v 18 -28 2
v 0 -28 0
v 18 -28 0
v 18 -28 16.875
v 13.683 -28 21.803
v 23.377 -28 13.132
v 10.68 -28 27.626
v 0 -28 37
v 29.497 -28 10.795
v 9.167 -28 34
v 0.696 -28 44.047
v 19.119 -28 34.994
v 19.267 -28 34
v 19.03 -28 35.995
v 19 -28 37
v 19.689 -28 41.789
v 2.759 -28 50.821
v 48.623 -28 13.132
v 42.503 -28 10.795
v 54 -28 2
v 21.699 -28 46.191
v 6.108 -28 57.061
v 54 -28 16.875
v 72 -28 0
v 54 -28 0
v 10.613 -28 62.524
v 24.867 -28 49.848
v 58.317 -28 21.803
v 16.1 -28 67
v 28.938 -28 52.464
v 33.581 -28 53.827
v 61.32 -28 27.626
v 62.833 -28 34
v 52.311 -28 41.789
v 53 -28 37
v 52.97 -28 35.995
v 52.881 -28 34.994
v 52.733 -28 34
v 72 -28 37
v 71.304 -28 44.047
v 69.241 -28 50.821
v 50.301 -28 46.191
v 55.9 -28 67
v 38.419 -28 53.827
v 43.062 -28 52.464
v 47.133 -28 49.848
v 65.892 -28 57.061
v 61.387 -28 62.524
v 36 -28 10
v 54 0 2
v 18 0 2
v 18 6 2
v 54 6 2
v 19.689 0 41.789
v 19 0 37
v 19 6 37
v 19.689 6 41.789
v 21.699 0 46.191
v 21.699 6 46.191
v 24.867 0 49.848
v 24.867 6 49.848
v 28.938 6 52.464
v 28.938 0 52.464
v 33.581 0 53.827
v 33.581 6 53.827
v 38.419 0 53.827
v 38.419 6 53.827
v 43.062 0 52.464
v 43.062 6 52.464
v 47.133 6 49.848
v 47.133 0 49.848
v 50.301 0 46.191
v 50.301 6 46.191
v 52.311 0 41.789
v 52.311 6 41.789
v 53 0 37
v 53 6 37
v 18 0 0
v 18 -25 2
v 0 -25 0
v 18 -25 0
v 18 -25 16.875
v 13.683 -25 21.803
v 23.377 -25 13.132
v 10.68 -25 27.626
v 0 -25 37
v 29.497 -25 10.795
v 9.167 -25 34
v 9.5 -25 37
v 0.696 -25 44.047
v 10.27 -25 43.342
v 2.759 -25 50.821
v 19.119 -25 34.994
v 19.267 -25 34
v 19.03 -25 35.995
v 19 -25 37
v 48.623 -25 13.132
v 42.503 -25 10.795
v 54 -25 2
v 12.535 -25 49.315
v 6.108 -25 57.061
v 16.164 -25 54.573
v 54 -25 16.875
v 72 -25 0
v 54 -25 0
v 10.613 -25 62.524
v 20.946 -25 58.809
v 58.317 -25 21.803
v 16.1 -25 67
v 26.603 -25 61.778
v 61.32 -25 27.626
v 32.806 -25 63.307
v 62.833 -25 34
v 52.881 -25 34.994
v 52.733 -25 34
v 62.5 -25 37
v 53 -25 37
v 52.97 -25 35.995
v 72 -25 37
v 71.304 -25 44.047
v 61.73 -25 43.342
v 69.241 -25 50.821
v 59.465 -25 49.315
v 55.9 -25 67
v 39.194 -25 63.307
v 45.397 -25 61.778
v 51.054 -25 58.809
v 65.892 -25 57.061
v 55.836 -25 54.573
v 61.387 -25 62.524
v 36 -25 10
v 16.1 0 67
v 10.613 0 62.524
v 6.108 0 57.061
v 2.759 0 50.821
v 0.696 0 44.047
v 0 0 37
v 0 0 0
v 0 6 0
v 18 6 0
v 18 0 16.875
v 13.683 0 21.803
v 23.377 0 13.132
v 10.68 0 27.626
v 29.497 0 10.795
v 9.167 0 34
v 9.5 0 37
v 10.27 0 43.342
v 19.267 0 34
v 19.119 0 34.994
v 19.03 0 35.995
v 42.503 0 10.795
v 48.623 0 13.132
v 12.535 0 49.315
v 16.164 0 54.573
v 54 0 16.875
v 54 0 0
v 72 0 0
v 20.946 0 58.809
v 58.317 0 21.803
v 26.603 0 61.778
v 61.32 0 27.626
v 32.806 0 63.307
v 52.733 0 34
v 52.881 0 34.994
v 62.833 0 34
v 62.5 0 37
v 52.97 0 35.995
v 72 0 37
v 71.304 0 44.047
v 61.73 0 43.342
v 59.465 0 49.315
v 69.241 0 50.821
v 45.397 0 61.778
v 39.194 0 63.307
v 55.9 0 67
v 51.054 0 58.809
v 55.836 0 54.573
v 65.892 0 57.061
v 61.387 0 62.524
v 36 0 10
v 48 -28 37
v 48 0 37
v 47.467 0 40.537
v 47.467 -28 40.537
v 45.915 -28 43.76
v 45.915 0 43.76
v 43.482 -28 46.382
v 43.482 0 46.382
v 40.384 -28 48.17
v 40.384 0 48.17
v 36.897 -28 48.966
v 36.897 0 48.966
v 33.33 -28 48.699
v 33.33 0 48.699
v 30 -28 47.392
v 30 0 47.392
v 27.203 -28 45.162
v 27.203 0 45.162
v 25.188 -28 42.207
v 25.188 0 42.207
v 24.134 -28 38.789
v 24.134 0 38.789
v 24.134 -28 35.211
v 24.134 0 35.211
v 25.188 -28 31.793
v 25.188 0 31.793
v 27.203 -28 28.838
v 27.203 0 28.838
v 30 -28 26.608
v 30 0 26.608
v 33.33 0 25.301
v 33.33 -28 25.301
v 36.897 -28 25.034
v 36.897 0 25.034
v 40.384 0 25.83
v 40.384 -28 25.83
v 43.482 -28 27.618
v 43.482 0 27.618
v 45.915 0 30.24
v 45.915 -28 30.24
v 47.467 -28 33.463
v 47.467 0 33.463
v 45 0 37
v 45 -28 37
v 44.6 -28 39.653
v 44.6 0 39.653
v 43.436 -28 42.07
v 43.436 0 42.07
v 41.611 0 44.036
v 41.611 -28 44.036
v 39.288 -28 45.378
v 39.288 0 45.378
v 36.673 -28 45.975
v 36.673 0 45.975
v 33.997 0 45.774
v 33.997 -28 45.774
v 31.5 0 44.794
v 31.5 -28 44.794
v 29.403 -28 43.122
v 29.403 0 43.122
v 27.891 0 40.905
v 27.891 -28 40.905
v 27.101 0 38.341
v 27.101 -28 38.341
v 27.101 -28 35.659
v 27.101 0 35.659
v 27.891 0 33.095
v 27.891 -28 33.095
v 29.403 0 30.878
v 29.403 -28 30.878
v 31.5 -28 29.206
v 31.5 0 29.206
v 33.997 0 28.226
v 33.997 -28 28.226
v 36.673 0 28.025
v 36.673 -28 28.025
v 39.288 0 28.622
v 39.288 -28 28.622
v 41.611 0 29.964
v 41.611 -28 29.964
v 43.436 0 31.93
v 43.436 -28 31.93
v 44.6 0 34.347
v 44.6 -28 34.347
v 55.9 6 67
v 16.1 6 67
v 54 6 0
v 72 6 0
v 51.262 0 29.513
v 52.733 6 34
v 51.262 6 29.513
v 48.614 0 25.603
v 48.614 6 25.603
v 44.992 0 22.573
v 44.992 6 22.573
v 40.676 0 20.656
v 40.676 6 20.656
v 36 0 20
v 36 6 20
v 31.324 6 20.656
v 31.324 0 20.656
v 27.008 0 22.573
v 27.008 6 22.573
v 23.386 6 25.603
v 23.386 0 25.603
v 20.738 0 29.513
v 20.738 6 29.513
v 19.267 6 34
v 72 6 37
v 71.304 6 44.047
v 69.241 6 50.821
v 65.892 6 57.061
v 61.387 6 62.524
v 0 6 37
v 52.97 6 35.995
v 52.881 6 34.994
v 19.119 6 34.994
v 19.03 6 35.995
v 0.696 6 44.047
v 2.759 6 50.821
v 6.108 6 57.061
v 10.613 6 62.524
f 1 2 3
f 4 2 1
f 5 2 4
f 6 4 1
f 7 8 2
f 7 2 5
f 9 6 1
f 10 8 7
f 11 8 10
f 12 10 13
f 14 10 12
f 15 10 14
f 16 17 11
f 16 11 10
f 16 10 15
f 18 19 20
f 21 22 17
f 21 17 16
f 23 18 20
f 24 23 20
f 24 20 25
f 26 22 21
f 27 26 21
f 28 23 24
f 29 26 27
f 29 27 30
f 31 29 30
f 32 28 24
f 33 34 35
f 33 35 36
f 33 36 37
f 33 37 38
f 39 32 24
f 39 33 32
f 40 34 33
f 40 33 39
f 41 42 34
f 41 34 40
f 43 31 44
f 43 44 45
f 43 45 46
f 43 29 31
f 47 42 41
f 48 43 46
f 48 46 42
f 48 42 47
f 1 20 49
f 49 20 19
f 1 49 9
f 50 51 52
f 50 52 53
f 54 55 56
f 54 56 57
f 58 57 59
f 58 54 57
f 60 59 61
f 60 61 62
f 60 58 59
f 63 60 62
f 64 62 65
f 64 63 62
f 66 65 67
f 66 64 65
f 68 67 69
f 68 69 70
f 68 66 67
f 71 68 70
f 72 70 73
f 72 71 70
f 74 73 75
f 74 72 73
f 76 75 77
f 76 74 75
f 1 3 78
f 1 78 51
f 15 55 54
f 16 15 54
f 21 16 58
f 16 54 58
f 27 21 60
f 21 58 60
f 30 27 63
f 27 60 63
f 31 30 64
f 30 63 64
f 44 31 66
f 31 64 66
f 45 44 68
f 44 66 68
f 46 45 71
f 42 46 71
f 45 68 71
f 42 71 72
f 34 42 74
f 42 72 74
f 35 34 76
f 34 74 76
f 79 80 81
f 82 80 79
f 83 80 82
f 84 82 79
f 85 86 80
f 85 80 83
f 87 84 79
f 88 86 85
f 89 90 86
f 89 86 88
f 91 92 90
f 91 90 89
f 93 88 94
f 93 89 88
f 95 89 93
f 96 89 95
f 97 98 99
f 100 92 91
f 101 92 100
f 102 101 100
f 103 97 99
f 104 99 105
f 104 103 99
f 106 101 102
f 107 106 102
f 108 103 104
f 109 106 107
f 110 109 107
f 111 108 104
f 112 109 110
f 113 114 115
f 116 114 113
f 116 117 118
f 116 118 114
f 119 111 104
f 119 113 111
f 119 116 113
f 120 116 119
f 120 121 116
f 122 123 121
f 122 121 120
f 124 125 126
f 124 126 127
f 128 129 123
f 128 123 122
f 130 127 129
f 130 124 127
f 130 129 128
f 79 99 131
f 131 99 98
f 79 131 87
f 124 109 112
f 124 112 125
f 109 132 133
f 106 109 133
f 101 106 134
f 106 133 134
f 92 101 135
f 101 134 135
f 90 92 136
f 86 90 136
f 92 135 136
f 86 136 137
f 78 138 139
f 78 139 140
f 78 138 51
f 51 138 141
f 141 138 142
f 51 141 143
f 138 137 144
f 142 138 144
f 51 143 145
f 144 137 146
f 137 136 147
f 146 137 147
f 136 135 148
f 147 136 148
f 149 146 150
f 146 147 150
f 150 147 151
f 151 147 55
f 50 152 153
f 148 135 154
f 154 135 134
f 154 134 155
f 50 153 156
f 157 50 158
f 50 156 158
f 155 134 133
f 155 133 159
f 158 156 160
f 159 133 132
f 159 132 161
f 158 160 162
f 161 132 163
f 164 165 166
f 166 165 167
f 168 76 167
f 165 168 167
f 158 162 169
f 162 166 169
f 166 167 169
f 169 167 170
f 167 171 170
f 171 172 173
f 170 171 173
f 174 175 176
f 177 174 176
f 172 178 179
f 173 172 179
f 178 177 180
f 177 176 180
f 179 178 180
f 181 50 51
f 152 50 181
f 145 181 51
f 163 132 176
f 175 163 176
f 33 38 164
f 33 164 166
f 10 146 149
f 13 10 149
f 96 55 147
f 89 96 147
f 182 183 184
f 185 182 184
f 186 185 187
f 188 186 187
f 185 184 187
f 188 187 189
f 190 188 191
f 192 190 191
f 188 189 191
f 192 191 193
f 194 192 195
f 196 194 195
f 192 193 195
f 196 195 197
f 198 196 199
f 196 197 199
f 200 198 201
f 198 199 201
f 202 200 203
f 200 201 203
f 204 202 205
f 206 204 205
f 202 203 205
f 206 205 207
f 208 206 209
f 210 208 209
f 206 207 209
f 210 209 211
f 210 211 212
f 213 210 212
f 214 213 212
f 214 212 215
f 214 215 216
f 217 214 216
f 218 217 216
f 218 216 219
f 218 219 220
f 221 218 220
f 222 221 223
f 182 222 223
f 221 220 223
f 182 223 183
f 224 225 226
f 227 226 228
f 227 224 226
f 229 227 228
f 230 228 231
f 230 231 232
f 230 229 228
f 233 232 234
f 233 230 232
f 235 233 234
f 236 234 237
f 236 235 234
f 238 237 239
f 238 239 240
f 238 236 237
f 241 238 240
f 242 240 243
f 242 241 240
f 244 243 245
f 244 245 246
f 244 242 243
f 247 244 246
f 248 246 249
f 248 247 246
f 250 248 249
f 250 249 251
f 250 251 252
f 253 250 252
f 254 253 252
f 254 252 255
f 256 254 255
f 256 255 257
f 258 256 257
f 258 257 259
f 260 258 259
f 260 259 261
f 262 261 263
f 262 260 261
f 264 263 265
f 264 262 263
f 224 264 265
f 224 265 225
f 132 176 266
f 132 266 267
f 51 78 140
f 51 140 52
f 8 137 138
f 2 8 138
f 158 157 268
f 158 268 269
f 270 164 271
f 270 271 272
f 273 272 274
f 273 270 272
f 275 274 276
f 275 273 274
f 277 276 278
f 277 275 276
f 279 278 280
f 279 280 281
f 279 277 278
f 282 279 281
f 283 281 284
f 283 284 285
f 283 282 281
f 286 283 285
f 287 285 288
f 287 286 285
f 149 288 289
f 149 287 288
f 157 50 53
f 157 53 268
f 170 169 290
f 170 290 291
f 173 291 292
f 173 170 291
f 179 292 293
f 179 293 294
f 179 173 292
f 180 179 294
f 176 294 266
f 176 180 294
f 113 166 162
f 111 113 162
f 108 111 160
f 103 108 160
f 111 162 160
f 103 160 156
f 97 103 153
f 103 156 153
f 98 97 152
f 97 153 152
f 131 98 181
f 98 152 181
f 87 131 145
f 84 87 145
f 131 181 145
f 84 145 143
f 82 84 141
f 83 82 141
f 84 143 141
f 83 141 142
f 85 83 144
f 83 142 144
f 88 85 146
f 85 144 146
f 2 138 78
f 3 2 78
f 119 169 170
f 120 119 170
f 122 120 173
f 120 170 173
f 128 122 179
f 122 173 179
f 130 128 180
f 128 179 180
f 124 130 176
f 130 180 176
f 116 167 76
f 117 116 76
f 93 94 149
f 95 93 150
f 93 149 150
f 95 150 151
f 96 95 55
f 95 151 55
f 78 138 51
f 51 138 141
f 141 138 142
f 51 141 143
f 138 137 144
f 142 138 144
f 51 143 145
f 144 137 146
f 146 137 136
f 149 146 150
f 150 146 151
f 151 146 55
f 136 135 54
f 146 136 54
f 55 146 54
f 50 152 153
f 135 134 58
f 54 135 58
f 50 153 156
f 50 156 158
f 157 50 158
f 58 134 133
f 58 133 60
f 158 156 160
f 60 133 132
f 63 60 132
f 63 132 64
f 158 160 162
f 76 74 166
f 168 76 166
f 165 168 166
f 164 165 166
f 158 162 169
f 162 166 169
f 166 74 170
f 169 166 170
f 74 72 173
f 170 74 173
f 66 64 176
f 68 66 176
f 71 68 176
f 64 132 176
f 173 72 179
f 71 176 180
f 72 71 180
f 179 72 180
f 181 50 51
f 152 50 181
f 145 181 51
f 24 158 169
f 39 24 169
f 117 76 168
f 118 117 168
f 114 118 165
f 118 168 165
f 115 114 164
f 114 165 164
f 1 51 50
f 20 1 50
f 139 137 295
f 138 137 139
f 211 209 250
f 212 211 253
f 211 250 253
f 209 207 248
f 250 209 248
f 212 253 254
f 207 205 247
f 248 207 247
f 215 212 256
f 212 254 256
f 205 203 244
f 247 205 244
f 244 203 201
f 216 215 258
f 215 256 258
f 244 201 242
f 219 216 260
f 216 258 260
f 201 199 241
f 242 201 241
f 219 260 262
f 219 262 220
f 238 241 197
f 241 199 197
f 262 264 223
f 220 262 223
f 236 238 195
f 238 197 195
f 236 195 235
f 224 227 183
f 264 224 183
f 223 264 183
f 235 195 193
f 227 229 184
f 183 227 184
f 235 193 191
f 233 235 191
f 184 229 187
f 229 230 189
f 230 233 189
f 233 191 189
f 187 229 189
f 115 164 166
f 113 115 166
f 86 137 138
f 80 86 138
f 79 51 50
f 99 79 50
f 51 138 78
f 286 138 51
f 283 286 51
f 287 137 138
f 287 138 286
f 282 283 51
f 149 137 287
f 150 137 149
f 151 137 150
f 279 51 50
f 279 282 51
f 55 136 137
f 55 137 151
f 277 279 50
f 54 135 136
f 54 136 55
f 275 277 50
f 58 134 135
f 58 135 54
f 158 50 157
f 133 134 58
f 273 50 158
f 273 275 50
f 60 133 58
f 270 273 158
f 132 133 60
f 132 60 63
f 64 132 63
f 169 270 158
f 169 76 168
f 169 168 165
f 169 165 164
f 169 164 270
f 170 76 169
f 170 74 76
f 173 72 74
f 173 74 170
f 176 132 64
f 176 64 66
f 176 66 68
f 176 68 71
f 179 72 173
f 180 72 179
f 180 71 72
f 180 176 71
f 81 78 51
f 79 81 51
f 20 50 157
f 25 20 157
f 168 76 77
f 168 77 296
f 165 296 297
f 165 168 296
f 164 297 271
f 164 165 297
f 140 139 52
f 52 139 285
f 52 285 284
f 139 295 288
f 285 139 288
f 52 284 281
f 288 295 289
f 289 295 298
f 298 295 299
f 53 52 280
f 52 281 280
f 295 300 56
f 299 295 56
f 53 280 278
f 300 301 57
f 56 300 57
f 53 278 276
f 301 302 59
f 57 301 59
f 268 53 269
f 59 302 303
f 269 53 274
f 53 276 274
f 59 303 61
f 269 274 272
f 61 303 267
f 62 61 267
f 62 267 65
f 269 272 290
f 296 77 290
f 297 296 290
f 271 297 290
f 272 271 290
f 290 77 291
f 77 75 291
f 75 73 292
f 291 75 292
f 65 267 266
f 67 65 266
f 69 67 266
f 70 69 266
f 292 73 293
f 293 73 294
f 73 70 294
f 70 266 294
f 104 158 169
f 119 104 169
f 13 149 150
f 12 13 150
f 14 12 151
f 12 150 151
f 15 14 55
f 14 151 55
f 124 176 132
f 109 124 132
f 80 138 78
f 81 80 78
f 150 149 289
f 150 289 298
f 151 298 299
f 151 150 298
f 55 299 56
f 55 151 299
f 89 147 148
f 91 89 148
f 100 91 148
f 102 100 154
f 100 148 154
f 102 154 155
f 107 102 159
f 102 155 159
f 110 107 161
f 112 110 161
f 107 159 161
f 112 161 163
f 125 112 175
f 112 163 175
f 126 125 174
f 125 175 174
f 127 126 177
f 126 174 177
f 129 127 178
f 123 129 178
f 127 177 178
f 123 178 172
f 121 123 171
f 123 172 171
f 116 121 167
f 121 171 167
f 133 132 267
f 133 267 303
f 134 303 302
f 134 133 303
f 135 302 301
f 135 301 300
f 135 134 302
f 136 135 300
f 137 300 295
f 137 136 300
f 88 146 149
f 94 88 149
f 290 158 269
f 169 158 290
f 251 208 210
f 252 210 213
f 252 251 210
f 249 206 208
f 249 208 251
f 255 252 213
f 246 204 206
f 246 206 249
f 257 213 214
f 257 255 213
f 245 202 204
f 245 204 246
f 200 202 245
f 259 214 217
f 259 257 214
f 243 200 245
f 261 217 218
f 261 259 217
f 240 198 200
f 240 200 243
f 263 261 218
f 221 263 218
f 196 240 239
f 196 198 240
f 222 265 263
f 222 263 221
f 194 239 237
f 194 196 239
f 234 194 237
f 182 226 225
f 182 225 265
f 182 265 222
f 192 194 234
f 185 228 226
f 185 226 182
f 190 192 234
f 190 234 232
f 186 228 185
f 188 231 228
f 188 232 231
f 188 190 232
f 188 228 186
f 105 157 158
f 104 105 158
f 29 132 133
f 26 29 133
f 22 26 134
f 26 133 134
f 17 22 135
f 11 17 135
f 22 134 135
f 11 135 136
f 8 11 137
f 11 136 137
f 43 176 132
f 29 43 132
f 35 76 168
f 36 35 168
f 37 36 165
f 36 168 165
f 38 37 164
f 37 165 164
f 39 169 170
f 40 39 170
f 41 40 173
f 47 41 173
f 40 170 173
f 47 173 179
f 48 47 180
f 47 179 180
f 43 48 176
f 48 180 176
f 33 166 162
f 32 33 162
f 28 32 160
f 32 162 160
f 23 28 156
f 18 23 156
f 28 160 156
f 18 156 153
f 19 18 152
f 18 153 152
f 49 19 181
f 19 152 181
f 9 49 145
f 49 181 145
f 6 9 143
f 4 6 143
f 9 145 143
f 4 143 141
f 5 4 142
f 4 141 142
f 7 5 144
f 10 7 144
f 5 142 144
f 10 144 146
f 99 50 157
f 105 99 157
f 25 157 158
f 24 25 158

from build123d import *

# Parameters (mm, degrees)
F1_DEPTH = 28
F0_R     = 9
F2_DEPTH = 6
F3_DEPTH = 25


# Not quite as in the source:
# - a feature names something its author has since deleted; it is built from what else it names


with BuildPart() as f1:
    # F0 (on Front) → F1 (new body)
    with BuildSketch(Plane.XZ):
        with BuildLine():
            Line((0, 37), (0, 34))
            Line((0, 34), (9.16718427, 34))
            Line((9.16718427, 34), (9.6703589086, 34))
            Line((9.6703589086, 34), (16.2262800667, 34))
            Line((16.2262800667, 34), (19.2667994693, 34))
            ThreePointArc((19.2667994693, 34), (19.0668312324, 35.494079853), (19, 37))
            Line((19, 37), (9.5, 37))
            ThreePointArc((9.5, 37), (36, 63.5), (62.5, 37))
            Line((62.5, 37), (53, 37))
            ThreePointArc((53, 37), (52.9331687676, 35.494079853), (52.7332005307, 34))
            Line((52.7332005307, 34), (62.83281573, 34))
            Line((62.83281573, 34), (72, 34))
            Line((72, 34), (72, 37))
            ThreePointArc((72, 37), (67.7205844423, 54.0236459856), (55.8997487421, 67))
            Line((55.8997487421, 67), (16.1002512579, 67))
            ThreePointArc((16.1002512579, 67), (4.2794155577, 54.0236459856), (0, 37))
        make_face()
        with BuildLine():
            ThreePointArc((19, 37), (36, 54), (53, 37))
            Line((53, 37), (62.5, 37))
            ThreePointArc((62.5, 37), (36, 63.5), (9.5, 37))
            Line((9.5, 37), (19, 37))
        make_face()
        with BuildLine():
            Line((0, 34), (0, 0))
            Line((0, 0), (18, 0))
            Line((18, 0), (18, 2))
            Line((18, 2), (54, 2))
            Line((54, 2), (54, 0))
            Line((54, 0), (72, 0))
            Line((72, 0), (72, 34))
            Line((72, 34), (62.83281573, 34))
            ThreePointArc((62.83281573, 34), (36, 10), (9.16718427, 34))
            Line((9.16718427, 34), (0, 34))
        make_face()
    extrude(amount=F1_DEPTH)


with BuildPart() as f1b:
    # F0 (on Front) → F1, piece 2 (new body)
    with BuildSketch(Plane.XZ):
        with BuildLine():
            ThreePointArc((24, 37), (36, 25), (48, 37))
            ThreePointArc((48, 37), (36, 49), (24, 37))
        make_face()
        with Locations((36, 37)):
            Circle(F0_R, mode=Mode.SUBTRACT)
    extrude(amount=F1_DEPTH)


with BuildPart() as f2:
    # F0 (on Front) → F2 (new body)
    with BuildSketch(Plane.XZ):
        with BuildLine():
            ThreePointArc((19, 37), (36, 54), (53, 37))
            Line((53, 37), (62.5, 37))
            ThreePointArc((62.5, 37), (36, 63.5), (9.5, 37))
            Line((9.5, 37), (19, 37))
        make_face()
        with BuildLine():
            Line((0, 37), (0, 34))
            Line((0, 34), (9.16718427, 34))
            Line((9.16718427, 34), (9.6703589086, 34))
            Line((9.6703589086, 34), (16.2262800667, 34))
            Line((16.2262800667, 34), (19.2667994693, 34))
            ThreePointArc((19.2667994693, 34), (19.0668312324, 35.494079853), (19, 37))
            Line((19, 37), (9.5, 37))
            ThreePointArc((9.5, 37), (36, 63.5), (62.5, 37))
            Line((62.5, 37), (53, 37))
            ThreePointArc((53, 37), (52.9331687676, 35.494079853), (52.7332005307, 34))
            Line((52.7332005307, 34), (62.83281573, 34))
            Line((62.83281573, 34), (72, 34))
            Line((72, 34), (72, 37))
            ThreePointArc((72, 37), (67.7205844423, 54.0236459856), (55.8997487421, 67))
            Line((55.8997487421, 67), (16.1002512579, 67))
            ThreePointArc((16.1002512579, 67), (4.2794155577, 54.0236459856), (0, 37))
        make_face()
        with BuildLine():
            Line((0, 34), (0, 0))
            Line((0, 0), (18, 0))
            Line((18, 0), (18, 2))
            Line((18, 2), (54, 2))
            Line((54, 2), (54, 0))
            Line((54, 0), (72, 0))
            Line((72, 0), (72, 34))
            Line((72, 34), (62.83281573, 34))
            ThreePointArc((62.83281573, 34), (36, 10), (9.16718427, 34))
            Line((9.16718427, 34), (0, 34))
        make_face()
        with BuildLine():
            Line((9.6703589086, 34), (9.16718427, 34))
            ThreePointArc((9.16718427, 34), (36, 10), (62.83281573, 34))
            Line((62.83281573, 34), (52.7332005307, 34))
            ThreePointArc((52.7332005307, 34), (36, 20), (19.2667994693, 34))
            Line((19.2667994693, 34), (16.2262800667, 34))
            Line((16.2262800667, 34), (9.6703589086, 34))
        make_face()
    extrude(amount=-F2_DEPTH)


with BuildPart() as f3:
    # F0 (on Front) → F3 (new body)
    with BuildSketch(Plane.XZ):
        with BuildLine():
            Line((0, 34), (0, 0))
            Line((0, 0), (18, 0))
            Line((18, 0), (18, 2))
            Line((18, 2), (54, 2))
            Line((54, 2), (54, 0))
            Line((54, 0), (72, 0))
            Line((72, 0), (72, 34))
            Line((72, 34), (62.83281573, 34))
            ThreePointArc((62.83281573, 34), (36, 10), (9.16718427, 34))
            Line((9.16718427, 34), (0, 34))
        make_face()
        with BuildLine():
            Line((0, 37), (0, 34))
            Line((0, 34), (9.16718427, 34))
            Line((9.16718427, 34), (9.6703589086, 34))
            Line((9.6703589086, 34), (16.2262800667, 34))
            Line((16.2262800667, 34), (19.2667994693, 34))
            ThreePointArc((19.2667994693, 34), (19.0668312324, 35.494079853), (19, 37))
            Line((19, 37), (9.5, 37))
            ThreePointArc((9.5, 37), (36, 63.5), (62.5, 37))
            Line((62.5, 37), (53, 37))
            ThreePointArc((53, 37), (52.9331687676, 35.494079853), (52.7332005307, 34))
            Line((52.7332005307, 34), (62.83281573, 34))
            Line((62.83281573, 34), (72, 34))
            Line((72, 34), (72, 37))
            ThreePointArc((72, 37), (67.7205844423, 54.0236459856), (55.8997487421, 67))
            Line((55.8997487421, 67), (16.1002512579, 67))
            ThreePointArc((16.1002512579, 67), (4.2794155577, 54.0236459856), (0, 37))
        make_face()
    extrude(amount=F3_DEPTH)


solid = Compound([f1.part, f1b.part, f2.part, f3.part])
